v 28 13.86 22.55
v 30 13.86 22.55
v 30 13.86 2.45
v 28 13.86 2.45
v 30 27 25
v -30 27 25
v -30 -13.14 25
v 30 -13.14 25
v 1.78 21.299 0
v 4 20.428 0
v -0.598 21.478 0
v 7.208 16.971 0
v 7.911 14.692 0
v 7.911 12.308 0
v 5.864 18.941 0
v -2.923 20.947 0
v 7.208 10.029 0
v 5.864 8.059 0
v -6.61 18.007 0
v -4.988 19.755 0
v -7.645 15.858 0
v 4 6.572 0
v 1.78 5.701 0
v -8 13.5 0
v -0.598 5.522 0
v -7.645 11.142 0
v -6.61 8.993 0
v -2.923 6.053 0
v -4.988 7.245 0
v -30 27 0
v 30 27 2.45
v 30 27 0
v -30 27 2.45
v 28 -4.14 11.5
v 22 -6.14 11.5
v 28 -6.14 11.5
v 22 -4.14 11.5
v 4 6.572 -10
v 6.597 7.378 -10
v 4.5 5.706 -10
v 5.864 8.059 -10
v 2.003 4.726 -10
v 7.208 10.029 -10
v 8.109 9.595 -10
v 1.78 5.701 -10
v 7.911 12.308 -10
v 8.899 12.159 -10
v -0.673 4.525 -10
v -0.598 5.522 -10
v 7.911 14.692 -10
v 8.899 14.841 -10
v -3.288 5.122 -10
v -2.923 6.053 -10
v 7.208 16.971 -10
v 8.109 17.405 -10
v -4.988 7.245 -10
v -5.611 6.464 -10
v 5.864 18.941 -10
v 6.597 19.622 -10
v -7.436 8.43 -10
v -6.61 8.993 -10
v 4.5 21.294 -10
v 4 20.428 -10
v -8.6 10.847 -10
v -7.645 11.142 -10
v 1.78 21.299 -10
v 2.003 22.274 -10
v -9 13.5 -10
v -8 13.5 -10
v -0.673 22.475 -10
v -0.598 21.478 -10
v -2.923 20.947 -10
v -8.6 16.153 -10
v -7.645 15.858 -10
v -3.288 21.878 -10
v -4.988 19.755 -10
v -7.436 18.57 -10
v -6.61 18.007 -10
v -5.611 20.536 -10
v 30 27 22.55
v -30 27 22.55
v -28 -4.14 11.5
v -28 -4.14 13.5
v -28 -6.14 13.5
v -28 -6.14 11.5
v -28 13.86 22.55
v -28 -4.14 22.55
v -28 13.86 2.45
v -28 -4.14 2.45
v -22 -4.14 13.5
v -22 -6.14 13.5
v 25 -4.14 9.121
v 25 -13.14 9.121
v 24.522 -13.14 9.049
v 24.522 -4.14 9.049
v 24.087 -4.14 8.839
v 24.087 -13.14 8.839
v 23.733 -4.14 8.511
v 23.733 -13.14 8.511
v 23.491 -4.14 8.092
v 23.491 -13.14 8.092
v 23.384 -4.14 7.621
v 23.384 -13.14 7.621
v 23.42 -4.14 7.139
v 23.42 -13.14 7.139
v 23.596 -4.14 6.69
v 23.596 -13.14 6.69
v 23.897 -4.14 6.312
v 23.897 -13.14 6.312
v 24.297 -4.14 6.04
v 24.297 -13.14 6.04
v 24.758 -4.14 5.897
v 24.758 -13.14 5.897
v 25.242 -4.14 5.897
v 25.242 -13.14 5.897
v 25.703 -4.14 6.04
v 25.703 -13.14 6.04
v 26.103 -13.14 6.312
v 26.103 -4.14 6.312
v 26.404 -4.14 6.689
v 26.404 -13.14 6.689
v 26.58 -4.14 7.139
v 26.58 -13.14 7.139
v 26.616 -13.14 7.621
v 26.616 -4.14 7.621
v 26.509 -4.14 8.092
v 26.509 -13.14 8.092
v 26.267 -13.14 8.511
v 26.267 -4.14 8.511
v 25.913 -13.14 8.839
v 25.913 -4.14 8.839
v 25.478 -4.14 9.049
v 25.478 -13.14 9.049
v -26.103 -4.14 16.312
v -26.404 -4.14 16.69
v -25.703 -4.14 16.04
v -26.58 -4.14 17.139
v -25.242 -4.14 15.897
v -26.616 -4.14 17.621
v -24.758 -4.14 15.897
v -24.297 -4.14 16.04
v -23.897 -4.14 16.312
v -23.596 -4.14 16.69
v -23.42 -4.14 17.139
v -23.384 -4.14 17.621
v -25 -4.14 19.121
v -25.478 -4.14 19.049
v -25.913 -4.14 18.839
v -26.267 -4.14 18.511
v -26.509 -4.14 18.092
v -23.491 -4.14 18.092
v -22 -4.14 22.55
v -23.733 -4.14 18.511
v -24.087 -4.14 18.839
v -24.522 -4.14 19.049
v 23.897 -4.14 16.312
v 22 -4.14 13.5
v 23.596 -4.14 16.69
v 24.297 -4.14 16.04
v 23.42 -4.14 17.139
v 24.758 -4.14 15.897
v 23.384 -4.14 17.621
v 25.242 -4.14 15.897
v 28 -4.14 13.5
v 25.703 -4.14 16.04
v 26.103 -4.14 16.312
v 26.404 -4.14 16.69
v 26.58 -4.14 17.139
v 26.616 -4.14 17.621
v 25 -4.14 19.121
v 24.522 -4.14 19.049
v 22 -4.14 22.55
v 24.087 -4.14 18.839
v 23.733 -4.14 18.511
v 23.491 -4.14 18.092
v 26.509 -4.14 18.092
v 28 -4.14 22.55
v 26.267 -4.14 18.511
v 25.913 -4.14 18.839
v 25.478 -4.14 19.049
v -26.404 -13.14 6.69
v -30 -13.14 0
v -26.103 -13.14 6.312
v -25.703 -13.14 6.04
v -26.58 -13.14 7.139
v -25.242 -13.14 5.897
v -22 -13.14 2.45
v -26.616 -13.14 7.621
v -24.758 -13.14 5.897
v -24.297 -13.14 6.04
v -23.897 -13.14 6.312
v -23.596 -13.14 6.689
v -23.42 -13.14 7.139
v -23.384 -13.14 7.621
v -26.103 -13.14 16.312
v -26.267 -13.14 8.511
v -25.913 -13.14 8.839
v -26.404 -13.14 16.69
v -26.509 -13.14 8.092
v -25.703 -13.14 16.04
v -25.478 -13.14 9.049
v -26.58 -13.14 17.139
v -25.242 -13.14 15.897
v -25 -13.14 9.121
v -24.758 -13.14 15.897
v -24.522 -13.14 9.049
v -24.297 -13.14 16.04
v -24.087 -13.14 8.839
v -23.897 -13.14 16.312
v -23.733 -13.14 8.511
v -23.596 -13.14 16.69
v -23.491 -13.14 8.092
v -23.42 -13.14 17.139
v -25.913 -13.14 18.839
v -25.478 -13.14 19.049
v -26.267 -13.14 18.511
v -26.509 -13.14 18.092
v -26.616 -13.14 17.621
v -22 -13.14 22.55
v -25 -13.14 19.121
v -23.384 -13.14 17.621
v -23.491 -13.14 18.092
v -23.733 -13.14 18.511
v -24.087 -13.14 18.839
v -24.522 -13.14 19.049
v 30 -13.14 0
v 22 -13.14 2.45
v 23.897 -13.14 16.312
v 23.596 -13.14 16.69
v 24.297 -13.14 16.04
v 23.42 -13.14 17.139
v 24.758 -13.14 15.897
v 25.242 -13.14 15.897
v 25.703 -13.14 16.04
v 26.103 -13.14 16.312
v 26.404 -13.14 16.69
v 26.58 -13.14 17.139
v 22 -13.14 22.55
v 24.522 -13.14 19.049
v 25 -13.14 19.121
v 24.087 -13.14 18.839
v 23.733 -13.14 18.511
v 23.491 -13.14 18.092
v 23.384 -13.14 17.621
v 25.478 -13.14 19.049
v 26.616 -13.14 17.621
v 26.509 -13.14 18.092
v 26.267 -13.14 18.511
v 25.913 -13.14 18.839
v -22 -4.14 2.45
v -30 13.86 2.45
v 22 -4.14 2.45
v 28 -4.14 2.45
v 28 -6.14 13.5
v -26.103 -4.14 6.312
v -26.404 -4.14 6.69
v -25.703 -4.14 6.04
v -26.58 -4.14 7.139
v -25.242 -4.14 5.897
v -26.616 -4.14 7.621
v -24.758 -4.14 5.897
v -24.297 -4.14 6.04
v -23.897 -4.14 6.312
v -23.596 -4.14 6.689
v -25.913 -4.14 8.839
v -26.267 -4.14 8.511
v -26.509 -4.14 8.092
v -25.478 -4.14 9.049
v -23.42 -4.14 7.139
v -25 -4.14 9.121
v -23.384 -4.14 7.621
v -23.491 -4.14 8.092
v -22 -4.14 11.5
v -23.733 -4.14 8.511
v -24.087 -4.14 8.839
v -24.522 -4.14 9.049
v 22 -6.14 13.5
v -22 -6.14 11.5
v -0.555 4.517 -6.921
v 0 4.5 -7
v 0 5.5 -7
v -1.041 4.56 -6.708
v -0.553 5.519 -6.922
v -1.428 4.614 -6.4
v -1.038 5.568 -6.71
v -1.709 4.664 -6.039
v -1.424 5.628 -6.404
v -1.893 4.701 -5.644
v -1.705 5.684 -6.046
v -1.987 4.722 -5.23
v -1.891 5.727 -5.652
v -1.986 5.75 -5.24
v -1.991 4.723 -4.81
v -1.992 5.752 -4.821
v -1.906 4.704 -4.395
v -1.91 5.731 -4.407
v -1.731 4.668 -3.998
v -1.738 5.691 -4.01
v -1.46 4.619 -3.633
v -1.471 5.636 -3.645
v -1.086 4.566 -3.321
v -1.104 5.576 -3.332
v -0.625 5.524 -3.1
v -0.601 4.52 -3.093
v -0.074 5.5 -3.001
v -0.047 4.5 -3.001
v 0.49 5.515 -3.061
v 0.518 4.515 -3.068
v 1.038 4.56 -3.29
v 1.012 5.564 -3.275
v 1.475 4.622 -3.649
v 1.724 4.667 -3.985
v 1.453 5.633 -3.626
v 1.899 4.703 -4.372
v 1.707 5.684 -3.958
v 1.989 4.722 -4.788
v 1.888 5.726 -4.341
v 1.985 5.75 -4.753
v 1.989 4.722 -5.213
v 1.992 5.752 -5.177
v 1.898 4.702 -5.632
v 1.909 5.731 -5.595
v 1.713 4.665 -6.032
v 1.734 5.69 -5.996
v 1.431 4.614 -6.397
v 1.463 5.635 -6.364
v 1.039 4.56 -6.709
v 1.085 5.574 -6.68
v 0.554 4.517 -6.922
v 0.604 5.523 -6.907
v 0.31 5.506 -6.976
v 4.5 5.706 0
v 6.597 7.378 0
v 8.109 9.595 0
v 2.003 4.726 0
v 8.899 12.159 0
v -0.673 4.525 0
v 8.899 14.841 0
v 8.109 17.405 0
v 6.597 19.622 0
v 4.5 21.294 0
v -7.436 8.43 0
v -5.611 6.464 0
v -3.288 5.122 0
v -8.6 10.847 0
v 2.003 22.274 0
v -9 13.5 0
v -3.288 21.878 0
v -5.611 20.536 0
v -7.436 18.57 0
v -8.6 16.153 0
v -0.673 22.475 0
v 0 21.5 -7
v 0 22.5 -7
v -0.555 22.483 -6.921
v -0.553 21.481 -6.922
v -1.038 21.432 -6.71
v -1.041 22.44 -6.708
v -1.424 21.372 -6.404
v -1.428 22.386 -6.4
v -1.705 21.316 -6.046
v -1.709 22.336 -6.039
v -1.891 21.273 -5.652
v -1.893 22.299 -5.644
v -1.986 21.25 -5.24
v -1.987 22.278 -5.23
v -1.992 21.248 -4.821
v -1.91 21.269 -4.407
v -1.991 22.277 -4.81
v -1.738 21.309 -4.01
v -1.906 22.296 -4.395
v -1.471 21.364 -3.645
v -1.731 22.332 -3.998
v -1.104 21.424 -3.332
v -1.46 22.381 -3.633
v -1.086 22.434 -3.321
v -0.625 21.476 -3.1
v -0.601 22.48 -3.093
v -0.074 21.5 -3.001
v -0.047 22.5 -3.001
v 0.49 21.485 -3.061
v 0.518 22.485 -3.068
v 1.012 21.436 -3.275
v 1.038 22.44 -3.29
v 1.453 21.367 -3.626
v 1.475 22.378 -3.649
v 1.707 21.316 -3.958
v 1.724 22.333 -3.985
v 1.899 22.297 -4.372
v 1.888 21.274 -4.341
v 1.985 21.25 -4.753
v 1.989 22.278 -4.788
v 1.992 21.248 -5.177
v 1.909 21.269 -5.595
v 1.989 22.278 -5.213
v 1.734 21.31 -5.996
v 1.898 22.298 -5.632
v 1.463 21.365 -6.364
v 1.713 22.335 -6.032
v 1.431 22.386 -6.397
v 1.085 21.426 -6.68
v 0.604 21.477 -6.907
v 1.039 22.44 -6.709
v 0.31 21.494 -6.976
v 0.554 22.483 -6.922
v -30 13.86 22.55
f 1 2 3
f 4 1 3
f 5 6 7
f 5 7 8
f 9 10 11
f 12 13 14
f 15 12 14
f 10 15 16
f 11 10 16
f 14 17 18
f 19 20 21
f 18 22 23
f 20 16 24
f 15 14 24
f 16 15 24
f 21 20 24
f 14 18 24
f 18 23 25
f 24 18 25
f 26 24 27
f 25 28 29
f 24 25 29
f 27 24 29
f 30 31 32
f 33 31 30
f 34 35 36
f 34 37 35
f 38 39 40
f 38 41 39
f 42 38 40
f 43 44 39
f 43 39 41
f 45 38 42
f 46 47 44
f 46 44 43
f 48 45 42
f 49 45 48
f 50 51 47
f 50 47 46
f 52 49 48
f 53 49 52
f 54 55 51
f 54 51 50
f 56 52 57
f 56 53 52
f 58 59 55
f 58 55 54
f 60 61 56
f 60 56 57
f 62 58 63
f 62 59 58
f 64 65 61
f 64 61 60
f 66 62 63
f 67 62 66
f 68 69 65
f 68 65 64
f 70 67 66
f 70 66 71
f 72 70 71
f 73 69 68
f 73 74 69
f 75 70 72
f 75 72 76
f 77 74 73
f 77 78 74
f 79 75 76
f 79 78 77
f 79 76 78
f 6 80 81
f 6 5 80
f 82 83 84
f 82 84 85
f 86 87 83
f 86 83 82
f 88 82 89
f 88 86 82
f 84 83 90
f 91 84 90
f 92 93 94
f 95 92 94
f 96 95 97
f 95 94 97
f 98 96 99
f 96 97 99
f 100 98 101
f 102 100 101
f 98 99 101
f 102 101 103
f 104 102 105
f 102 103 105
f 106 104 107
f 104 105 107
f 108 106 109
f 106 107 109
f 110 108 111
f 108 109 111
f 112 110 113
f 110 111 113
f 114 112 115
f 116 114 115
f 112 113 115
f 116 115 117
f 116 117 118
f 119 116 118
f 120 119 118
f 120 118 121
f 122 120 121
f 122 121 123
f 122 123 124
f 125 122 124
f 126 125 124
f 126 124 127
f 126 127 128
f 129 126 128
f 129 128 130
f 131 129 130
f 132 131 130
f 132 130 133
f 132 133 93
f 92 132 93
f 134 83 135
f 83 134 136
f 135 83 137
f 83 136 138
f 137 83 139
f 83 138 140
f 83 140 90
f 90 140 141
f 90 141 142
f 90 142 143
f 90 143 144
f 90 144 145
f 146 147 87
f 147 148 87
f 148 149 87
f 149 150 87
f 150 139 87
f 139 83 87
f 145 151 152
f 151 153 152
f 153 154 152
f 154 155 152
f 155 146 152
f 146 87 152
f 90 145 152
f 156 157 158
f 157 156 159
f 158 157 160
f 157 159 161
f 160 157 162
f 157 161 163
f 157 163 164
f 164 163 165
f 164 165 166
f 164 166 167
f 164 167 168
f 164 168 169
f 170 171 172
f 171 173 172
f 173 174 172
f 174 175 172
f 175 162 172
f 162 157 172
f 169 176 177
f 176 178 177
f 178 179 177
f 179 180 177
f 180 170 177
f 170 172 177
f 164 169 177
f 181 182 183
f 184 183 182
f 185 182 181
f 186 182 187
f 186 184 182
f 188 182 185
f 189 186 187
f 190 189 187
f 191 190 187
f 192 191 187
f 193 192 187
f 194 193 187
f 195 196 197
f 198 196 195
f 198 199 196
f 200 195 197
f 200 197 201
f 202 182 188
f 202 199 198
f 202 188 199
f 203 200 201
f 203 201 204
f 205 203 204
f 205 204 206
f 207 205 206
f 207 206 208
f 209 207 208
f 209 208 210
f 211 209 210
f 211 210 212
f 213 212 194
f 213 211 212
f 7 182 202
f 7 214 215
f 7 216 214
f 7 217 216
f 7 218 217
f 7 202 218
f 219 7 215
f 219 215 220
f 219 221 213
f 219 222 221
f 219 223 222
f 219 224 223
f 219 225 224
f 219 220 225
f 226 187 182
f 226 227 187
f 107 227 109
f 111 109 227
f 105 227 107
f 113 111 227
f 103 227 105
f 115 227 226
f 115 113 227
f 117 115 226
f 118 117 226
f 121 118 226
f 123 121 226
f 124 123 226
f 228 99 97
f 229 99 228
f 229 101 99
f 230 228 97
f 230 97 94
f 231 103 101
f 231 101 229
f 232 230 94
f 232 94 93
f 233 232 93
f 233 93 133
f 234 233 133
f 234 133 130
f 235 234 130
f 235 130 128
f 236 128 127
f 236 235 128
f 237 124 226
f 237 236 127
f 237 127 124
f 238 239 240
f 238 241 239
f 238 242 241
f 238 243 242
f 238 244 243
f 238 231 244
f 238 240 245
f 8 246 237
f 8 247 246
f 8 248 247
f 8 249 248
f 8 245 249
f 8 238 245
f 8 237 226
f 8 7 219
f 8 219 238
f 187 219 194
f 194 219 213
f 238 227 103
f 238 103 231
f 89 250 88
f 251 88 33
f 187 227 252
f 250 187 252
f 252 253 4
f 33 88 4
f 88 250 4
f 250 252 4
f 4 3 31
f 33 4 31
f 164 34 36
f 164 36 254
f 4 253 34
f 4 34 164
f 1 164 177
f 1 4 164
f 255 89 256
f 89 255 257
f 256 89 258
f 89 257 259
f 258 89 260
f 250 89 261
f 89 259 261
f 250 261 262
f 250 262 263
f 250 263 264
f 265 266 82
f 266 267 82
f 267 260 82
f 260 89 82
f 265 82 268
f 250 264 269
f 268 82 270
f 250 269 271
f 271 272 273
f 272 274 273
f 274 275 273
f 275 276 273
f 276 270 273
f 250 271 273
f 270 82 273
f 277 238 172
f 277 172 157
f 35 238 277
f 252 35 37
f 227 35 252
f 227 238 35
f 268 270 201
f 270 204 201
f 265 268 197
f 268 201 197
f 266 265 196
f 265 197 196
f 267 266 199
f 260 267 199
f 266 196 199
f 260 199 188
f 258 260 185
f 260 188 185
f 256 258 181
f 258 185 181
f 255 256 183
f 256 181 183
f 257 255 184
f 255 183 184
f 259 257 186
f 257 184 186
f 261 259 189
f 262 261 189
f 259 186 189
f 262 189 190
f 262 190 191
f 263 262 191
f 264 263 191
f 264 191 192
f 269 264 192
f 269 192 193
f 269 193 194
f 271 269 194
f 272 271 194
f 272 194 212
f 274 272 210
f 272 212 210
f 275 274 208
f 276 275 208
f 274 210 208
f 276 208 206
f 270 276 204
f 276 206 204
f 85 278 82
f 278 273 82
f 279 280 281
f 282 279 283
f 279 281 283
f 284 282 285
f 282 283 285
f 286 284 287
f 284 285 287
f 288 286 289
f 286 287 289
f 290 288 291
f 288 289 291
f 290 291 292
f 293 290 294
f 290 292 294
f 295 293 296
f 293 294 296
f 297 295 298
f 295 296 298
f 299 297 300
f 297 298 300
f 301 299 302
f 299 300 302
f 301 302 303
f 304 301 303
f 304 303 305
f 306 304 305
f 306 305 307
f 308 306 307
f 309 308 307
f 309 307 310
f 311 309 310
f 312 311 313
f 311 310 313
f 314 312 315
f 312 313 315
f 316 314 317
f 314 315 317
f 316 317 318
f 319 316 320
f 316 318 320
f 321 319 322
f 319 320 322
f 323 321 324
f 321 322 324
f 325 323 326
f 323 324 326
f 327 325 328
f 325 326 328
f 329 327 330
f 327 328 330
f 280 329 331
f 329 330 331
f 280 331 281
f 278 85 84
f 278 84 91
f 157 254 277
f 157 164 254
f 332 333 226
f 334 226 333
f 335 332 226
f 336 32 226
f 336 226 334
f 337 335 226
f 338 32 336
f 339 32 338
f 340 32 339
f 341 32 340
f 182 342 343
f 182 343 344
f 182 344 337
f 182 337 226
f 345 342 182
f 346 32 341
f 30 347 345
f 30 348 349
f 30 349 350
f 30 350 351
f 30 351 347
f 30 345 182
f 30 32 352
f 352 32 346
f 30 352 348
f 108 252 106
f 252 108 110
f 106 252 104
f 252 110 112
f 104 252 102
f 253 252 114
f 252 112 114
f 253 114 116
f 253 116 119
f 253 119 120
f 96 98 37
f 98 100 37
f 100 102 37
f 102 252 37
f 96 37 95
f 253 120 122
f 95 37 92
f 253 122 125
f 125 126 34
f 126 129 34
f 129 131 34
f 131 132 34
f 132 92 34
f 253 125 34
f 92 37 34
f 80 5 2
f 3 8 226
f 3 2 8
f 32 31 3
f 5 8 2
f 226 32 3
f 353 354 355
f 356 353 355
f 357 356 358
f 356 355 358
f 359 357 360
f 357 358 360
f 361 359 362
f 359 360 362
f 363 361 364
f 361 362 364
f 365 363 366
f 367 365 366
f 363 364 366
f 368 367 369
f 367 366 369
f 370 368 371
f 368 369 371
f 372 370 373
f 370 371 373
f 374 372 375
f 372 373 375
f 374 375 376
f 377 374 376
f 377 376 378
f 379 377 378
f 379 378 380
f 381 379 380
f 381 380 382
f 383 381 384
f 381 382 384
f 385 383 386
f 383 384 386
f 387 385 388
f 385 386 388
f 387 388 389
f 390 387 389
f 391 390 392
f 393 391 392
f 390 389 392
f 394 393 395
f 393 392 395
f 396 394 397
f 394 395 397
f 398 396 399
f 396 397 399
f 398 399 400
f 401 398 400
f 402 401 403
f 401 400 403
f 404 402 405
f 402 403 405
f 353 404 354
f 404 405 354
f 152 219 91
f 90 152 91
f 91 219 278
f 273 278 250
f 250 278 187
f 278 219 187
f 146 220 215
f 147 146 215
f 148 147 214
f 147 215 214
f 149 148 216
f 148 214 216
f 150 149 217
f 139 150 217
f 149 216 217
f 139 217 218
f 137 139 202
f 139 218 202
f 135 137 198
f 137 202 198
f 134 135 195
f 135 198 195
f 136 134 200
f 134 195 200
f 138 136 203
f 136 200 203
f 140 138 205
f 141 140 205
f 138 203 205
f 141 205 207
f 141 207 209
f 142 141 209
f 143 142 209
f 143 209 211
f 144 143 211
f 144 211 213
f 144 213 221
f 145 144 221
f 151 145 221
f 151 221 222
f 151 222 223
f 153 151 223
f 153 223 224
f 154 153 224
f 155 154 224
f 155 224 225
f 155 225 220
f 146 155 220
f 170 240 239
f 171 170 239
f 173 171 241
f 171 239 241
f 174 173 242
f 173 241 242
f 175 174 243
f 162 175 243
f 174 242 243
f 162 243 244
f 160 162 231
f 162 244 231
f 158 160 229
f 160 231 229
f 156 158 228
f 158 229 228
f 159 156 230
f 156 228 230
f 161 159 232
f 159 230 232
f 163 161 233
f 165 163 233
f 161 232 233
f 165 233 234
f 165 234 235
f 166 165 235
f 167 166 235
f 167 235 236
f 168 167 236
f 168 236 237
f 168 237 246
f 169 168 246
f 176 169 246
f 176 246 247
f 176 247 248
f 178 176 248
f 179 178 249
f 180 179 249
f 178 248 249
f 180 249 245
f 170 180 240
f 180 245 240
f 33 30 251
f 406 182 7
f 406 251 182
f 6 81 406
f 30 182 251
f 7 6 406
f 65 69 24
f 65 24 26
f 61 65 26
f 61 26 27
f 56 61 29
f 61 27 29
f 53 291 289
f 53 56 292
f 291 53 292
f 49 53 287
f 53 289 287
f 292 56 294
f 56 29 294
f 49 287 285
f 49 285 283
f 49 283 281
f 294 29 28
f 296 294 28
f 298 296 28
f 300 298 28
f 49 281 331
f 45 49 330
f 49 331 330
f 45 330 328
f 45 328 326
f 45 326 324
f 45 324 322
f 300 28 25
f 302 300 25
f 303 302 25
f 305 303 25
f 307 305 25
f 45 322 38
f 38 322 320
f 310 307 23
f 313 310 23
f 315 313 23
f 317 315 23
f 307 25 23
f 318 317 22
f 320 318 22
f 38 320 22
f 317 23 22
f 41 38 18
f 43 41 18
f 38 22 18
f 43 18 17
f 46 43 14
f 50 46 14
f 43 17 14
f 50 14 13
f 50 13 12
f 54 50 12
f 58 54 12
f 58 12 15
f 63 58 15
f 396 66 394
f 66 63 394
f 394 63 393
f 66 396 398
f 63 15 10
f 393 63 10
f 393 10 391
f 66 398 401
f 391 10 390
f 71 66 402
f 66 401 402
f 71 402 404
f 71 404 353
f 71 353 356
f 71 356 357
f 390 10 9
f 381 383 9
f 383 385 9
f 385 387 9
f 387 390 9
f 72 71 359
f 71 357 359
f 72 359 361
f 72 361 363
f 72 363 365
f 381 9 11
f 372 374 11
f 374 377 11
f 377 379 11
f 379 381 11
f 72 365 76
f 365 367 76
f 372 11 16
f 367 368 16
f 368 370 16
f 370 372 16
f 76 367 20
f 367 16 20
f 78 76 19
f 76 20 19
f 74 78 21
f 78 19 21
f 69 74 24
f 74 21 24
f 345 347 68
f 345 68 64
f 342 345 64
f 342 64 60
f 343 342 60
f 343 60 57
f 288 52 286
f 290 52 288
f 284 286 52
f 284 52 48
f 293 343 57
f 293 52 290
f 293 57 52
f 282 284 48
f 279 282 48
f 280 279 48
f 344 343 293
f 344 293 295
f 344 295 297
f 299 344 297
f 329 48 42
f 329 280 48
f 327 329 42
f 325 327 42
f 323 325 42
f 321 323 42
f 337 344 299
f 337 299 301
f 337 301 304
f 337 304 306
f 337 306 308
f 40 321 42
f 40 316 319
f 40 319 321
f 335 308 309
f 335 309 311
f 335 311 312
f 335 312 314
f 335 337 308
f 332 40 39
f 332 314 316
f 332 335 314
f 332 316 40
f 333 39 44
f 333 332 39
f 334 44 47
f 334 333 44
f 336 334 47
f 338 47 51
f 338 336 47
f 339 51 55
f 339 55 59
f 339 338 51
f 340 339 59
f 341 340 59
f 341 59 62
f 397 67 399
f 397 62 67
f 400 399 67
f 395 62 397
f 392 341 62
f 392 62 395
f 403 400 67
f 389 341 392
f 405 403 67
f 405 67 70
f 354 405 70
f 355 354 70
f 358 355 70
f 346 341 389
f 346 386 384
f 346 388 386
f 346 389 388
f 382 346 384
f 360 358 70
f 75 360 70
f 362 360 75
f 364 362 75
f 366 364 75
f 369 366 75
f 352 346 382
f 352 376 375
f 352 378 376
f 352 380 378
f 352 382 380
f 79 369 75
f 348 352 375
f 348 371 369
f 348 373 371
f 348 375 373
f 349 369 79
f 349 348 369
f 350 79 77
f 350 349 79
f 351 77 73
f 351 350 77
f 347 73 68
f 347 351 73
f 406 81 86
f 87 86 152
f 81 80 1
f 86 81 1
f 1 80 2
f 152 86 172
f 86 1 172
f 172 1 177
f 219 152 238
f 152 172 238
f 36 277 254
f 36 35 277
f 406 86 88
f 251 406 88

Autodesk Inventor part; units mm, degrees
ref_plane "YZ Plane" through (0, 0, 0) normal (1, 0, 0) x (0, 1, 0)
ref_plane "XZ Plane" through (0, 0, 0) normal (0, 1, 0) x (-1, 0, 0)
ref_plane "XY Plane" through (0, 0, 0) normal (0, 0, 1) x (1, 0, 0)
sketch "Esquisse1" plane through (0, 0, 0) normal (0, 1, 0) x (-1, 0, 0)
  line L0 (0, 0) -> (0, 2.45)
  line L1 (0, 0) -> (2.45, 0) construction
  line L2 (0, 2.45) -> (28, 2.45)
  line L3 (28, 2.45) -> (28, 22.55)
  line L4 (28, 22.55) -> (-28, 22.55)
  line L5 (-28, 22.55) -> (-28, 2.45)
  line L6 (-28, 2.45) -> (0, 2.45)
  line L7 (0, 0) -> (30, 0)
  line L8 (30, 0) -> (30, 25)
  line L9 (30, 25) -> (-30, 25)
  line L10 (-30, 25) -> (-30, 0)
  line L11 (-30, 0) -> (0, 0)
  dimension "d0" = 2.45
  dimension "d1" = 90
  dimension "d2" = 28
  dimension "d3" = 20.1
  dimension "d4" = 56
  dimension "d5" = 30
  dimension "d6" = 25
  dimension "d7" = 60
extrude "Extrusion1" add sketch "Esquisse1" along normal blind 27
sketch "Esquisse2" plane through (30, 0, 0) normal (0, 0, -1) x (-1, 0, 0)
  line L0 (30, 0) -> (30, 27)
  line L1 (60, 27) -> (0, 27) projected
  line L2 (0, 0) -> (0, 27) projected
  line L3 (0, 13.5) -> (60, 13.5)
  line L4 (60, 0) -> (60, 27) projected
  circle A0 centre (30, 13.5) radius 8
  circle A1 centre (30, 13.5) radius 9
  dimension "d10" = 16
  dimension "d11" = 18
extrude "Extrusion2" add sketch "Esquisse2" along normal blind 10 contours A1 L3 A0 L0 | L0 A0 L3 A1 | A1 L0 A0 L3 | L3 A0 L0 A1
sketch "Esquisse3" plane through (0, 0, 0) normal (0, 1, 0) x (-1, 0, 0)
  line L0 (-9, -10) -> (9, -10) projected
  line L1 (0, -10) -> (0, -5)
  point P0 (0, 0)
  dimension "d14" = 5
hole "Perçage1" at (0, 0, -5) direction (0, 1, 0) diameter 4 end through all
sketch "Esquisse7" plane through (0, 0, 0) normal (0, -1, 0) x (1, 0, 0)
  line L0 (-30, 0) -> (-30, 25) projected
  line L1 (30, 0) -> (-30, 0) projected
  line L2 (30, 25) -> (30, 0) projected
  line L3 (-30, 25) -> (30, 25) projected
  line L4 (28, 22.55) -> (-28, 22.55) projected
  line L5 (-28, 2.45) -> (28, 2.45) projected
  line L6 (-28, 22.55) -> (-28, 2.45) projected
  line L7 (28, 2.45) -> (28, 22.55) projected
  point P0 (0, 0)
extrude "Extrusion5" add sketch "Esquisse7" along normal blind 13.14
sketch "Esquisse11" plane through (0, -13.14, 0) normal (0, -1, 0) x (1, 0, 0)
  line L0 (28, 22.55) -> (28, 2.45) projected
  line L1 (-28, 22.55) -> (28, 22.55) projected
  line L2 (28, 2.45) -> (28, 22.55) projected
  line L3 (28, 22.55) -> (28, 2.45)
  line L4 (28, 22.55) -> (-28, 22.55) projected
  line L5 (28, 22.55) -> (22, 22.55)
  line L6 (22, 22.55) -> (22, 2.45)
  line L7 (22, 2.45) -> (28, 2.45)
  line L8 (-28, 22.55) -> (-22, 22.55)
  line L9 (-22, 22.55) -> (-22, 2.45)
  line L10 (-28, 2.45) -> (28, 2.45) projected
  line L11 (-22, 2.45) -> (-28, 2.45)
  line L12 (-28, 22.55) -> (-28, 2.45) projected
  line L13 (-28, 22.55) -> (-28, 2.45)
  point P0 (0, 0)
  dimension "d46" = 6
  dimension "d47" = 6
extrude "Extrusion6" add sketch "Esquisse11" against normal blind 9 contours L0 L7 L6 L1 | L9 L10 L12 L1
sketch "Esquisse12" plane through (0, -4.14, 0) normal (0, 1, 0) x (1, 0, 0)
  line L0 (-22, -22.55) -> (-28, -22.55) projected
  line L1 (-28, -22.55) -> (-28, -13.5)
  line L2 (-28, -22.55) -> (-28, -2.45) projected
  line L3 (-28, -13.5) -> (-22, -13.5)
  line L4 (-22, -22.55) -> (-22, -2.45) projected
  line L5 (-22, -13.5) -> (-22, -11.5)
  line L6 (-22, -11.5) -> (-28, -11.5)
  line L7 (-28, -13.5) -> (-28, -11.5)
  line L8 (-28, -11.5) -> (-28, -13.5)
  line L9 (28, -2.45) -> (28, -22.55) projected
  line L10 (28, -22.55) -> (28, -13.5)
  line L11 (28, -13.5) -> (22, -13.5)
  line L12 (22, -13.5) -> (22, -11.5)
  line L13 (22, -22.55) -> (22, -2.45) projected
  line L14 (22, -11.5) -> (28, -11.5)
  line L15 (28, -11.5) -> (28, -13.5)
  line L16 (28, -13.5) -> (28, -11.5)
  point P0 (0, 0)
  dimension "d50" = 9.05
  dimension "d51" = 2
  dimension "d52" = 6
extrude "Extrusion7" cut sketch "Esquisse12" against normal blind 2 contours L3 L2 L6 L4 | L9 L11 L12 L14
sketch "Esquisse13" plane through (0, -4.14, 0) normal (0, 1, 0) x (1, 0, 0)
  line L0 (-28, -22.55) -> (-28, -2.45) projected
  line L1 (-28, -22.55) -> (-28, -12.5)
  line L2 (-28, -2.45) -> (-22, -2.45) projected
  line L3 (-28, -12.5) -> (-25, -12.5)
  line L4 (-25, -12.5) -> (-25, -7.5)
  line L5 (-25, -12.5) -> (-25, -17.5)
  line L6 (28, -13.5) -> (28, -22.55) projected
  line L7 (28, -22.55) -> (28, -12.5)
  line L8 (28, -12.5) -> (25, -12.5)
  line L9 (25, -12.5) -> (25, -7.5)
  line L10 (25, -7.5) -> (25, -17.5)
  point P0 (0, 0)
  dimension "d55" = 10.05
  dimension "d56" = 3
  dimension "d57" = 5
  dimension "d58" = 5
  dimension "d59" = 3
  dimension "d60" = 5
  dimension "d61" = 10
hole "Perçage3" at (-25, -4.14, 17.5) at (-25, -4.14, 7.5) at (25, -4.14, 17.5) at (25, -4.14, 7.5) direction (0, -1, 0) diameter 3.242 depth 11.8 tip angle 118 thread size "M4x0.7" class "6H" standard "ISO Metric profile"
sketch "Esquisse14" plane through (30, 27, 25) normal (1, 0, 0) x (0, 0, -1)
  line L0 (0, -40.14) -> (0, 0) projected
  line L1 (0, 0) -> (2.45, 0)
  line L2 (0, 0) -> (25, 0) projected
  line L3 (2.45, 0) -> (2.45, -13.14)
  line L4 (2.45, -31.14) -> (2.45, -40.14) projected
  line L5 (2.45, -13.14) -> (22.55, -13.14)
  line L6 (22.55, -13.14) -> (22.55, 0)
  line L7 (2.45, 0) -> (22.55, 0)
  line L8 (25, -40.14) -> (25, 0) projected
  point P0 (25, -27)
  dimension "d69" = 2.45
  dimension "d70" = 13.14
  dimension "d71" = 20.1
extrude "Extrusion8" cut sketch "Esquisse14" against normal through all
properties part number "Attache servomoteur_bogie"
